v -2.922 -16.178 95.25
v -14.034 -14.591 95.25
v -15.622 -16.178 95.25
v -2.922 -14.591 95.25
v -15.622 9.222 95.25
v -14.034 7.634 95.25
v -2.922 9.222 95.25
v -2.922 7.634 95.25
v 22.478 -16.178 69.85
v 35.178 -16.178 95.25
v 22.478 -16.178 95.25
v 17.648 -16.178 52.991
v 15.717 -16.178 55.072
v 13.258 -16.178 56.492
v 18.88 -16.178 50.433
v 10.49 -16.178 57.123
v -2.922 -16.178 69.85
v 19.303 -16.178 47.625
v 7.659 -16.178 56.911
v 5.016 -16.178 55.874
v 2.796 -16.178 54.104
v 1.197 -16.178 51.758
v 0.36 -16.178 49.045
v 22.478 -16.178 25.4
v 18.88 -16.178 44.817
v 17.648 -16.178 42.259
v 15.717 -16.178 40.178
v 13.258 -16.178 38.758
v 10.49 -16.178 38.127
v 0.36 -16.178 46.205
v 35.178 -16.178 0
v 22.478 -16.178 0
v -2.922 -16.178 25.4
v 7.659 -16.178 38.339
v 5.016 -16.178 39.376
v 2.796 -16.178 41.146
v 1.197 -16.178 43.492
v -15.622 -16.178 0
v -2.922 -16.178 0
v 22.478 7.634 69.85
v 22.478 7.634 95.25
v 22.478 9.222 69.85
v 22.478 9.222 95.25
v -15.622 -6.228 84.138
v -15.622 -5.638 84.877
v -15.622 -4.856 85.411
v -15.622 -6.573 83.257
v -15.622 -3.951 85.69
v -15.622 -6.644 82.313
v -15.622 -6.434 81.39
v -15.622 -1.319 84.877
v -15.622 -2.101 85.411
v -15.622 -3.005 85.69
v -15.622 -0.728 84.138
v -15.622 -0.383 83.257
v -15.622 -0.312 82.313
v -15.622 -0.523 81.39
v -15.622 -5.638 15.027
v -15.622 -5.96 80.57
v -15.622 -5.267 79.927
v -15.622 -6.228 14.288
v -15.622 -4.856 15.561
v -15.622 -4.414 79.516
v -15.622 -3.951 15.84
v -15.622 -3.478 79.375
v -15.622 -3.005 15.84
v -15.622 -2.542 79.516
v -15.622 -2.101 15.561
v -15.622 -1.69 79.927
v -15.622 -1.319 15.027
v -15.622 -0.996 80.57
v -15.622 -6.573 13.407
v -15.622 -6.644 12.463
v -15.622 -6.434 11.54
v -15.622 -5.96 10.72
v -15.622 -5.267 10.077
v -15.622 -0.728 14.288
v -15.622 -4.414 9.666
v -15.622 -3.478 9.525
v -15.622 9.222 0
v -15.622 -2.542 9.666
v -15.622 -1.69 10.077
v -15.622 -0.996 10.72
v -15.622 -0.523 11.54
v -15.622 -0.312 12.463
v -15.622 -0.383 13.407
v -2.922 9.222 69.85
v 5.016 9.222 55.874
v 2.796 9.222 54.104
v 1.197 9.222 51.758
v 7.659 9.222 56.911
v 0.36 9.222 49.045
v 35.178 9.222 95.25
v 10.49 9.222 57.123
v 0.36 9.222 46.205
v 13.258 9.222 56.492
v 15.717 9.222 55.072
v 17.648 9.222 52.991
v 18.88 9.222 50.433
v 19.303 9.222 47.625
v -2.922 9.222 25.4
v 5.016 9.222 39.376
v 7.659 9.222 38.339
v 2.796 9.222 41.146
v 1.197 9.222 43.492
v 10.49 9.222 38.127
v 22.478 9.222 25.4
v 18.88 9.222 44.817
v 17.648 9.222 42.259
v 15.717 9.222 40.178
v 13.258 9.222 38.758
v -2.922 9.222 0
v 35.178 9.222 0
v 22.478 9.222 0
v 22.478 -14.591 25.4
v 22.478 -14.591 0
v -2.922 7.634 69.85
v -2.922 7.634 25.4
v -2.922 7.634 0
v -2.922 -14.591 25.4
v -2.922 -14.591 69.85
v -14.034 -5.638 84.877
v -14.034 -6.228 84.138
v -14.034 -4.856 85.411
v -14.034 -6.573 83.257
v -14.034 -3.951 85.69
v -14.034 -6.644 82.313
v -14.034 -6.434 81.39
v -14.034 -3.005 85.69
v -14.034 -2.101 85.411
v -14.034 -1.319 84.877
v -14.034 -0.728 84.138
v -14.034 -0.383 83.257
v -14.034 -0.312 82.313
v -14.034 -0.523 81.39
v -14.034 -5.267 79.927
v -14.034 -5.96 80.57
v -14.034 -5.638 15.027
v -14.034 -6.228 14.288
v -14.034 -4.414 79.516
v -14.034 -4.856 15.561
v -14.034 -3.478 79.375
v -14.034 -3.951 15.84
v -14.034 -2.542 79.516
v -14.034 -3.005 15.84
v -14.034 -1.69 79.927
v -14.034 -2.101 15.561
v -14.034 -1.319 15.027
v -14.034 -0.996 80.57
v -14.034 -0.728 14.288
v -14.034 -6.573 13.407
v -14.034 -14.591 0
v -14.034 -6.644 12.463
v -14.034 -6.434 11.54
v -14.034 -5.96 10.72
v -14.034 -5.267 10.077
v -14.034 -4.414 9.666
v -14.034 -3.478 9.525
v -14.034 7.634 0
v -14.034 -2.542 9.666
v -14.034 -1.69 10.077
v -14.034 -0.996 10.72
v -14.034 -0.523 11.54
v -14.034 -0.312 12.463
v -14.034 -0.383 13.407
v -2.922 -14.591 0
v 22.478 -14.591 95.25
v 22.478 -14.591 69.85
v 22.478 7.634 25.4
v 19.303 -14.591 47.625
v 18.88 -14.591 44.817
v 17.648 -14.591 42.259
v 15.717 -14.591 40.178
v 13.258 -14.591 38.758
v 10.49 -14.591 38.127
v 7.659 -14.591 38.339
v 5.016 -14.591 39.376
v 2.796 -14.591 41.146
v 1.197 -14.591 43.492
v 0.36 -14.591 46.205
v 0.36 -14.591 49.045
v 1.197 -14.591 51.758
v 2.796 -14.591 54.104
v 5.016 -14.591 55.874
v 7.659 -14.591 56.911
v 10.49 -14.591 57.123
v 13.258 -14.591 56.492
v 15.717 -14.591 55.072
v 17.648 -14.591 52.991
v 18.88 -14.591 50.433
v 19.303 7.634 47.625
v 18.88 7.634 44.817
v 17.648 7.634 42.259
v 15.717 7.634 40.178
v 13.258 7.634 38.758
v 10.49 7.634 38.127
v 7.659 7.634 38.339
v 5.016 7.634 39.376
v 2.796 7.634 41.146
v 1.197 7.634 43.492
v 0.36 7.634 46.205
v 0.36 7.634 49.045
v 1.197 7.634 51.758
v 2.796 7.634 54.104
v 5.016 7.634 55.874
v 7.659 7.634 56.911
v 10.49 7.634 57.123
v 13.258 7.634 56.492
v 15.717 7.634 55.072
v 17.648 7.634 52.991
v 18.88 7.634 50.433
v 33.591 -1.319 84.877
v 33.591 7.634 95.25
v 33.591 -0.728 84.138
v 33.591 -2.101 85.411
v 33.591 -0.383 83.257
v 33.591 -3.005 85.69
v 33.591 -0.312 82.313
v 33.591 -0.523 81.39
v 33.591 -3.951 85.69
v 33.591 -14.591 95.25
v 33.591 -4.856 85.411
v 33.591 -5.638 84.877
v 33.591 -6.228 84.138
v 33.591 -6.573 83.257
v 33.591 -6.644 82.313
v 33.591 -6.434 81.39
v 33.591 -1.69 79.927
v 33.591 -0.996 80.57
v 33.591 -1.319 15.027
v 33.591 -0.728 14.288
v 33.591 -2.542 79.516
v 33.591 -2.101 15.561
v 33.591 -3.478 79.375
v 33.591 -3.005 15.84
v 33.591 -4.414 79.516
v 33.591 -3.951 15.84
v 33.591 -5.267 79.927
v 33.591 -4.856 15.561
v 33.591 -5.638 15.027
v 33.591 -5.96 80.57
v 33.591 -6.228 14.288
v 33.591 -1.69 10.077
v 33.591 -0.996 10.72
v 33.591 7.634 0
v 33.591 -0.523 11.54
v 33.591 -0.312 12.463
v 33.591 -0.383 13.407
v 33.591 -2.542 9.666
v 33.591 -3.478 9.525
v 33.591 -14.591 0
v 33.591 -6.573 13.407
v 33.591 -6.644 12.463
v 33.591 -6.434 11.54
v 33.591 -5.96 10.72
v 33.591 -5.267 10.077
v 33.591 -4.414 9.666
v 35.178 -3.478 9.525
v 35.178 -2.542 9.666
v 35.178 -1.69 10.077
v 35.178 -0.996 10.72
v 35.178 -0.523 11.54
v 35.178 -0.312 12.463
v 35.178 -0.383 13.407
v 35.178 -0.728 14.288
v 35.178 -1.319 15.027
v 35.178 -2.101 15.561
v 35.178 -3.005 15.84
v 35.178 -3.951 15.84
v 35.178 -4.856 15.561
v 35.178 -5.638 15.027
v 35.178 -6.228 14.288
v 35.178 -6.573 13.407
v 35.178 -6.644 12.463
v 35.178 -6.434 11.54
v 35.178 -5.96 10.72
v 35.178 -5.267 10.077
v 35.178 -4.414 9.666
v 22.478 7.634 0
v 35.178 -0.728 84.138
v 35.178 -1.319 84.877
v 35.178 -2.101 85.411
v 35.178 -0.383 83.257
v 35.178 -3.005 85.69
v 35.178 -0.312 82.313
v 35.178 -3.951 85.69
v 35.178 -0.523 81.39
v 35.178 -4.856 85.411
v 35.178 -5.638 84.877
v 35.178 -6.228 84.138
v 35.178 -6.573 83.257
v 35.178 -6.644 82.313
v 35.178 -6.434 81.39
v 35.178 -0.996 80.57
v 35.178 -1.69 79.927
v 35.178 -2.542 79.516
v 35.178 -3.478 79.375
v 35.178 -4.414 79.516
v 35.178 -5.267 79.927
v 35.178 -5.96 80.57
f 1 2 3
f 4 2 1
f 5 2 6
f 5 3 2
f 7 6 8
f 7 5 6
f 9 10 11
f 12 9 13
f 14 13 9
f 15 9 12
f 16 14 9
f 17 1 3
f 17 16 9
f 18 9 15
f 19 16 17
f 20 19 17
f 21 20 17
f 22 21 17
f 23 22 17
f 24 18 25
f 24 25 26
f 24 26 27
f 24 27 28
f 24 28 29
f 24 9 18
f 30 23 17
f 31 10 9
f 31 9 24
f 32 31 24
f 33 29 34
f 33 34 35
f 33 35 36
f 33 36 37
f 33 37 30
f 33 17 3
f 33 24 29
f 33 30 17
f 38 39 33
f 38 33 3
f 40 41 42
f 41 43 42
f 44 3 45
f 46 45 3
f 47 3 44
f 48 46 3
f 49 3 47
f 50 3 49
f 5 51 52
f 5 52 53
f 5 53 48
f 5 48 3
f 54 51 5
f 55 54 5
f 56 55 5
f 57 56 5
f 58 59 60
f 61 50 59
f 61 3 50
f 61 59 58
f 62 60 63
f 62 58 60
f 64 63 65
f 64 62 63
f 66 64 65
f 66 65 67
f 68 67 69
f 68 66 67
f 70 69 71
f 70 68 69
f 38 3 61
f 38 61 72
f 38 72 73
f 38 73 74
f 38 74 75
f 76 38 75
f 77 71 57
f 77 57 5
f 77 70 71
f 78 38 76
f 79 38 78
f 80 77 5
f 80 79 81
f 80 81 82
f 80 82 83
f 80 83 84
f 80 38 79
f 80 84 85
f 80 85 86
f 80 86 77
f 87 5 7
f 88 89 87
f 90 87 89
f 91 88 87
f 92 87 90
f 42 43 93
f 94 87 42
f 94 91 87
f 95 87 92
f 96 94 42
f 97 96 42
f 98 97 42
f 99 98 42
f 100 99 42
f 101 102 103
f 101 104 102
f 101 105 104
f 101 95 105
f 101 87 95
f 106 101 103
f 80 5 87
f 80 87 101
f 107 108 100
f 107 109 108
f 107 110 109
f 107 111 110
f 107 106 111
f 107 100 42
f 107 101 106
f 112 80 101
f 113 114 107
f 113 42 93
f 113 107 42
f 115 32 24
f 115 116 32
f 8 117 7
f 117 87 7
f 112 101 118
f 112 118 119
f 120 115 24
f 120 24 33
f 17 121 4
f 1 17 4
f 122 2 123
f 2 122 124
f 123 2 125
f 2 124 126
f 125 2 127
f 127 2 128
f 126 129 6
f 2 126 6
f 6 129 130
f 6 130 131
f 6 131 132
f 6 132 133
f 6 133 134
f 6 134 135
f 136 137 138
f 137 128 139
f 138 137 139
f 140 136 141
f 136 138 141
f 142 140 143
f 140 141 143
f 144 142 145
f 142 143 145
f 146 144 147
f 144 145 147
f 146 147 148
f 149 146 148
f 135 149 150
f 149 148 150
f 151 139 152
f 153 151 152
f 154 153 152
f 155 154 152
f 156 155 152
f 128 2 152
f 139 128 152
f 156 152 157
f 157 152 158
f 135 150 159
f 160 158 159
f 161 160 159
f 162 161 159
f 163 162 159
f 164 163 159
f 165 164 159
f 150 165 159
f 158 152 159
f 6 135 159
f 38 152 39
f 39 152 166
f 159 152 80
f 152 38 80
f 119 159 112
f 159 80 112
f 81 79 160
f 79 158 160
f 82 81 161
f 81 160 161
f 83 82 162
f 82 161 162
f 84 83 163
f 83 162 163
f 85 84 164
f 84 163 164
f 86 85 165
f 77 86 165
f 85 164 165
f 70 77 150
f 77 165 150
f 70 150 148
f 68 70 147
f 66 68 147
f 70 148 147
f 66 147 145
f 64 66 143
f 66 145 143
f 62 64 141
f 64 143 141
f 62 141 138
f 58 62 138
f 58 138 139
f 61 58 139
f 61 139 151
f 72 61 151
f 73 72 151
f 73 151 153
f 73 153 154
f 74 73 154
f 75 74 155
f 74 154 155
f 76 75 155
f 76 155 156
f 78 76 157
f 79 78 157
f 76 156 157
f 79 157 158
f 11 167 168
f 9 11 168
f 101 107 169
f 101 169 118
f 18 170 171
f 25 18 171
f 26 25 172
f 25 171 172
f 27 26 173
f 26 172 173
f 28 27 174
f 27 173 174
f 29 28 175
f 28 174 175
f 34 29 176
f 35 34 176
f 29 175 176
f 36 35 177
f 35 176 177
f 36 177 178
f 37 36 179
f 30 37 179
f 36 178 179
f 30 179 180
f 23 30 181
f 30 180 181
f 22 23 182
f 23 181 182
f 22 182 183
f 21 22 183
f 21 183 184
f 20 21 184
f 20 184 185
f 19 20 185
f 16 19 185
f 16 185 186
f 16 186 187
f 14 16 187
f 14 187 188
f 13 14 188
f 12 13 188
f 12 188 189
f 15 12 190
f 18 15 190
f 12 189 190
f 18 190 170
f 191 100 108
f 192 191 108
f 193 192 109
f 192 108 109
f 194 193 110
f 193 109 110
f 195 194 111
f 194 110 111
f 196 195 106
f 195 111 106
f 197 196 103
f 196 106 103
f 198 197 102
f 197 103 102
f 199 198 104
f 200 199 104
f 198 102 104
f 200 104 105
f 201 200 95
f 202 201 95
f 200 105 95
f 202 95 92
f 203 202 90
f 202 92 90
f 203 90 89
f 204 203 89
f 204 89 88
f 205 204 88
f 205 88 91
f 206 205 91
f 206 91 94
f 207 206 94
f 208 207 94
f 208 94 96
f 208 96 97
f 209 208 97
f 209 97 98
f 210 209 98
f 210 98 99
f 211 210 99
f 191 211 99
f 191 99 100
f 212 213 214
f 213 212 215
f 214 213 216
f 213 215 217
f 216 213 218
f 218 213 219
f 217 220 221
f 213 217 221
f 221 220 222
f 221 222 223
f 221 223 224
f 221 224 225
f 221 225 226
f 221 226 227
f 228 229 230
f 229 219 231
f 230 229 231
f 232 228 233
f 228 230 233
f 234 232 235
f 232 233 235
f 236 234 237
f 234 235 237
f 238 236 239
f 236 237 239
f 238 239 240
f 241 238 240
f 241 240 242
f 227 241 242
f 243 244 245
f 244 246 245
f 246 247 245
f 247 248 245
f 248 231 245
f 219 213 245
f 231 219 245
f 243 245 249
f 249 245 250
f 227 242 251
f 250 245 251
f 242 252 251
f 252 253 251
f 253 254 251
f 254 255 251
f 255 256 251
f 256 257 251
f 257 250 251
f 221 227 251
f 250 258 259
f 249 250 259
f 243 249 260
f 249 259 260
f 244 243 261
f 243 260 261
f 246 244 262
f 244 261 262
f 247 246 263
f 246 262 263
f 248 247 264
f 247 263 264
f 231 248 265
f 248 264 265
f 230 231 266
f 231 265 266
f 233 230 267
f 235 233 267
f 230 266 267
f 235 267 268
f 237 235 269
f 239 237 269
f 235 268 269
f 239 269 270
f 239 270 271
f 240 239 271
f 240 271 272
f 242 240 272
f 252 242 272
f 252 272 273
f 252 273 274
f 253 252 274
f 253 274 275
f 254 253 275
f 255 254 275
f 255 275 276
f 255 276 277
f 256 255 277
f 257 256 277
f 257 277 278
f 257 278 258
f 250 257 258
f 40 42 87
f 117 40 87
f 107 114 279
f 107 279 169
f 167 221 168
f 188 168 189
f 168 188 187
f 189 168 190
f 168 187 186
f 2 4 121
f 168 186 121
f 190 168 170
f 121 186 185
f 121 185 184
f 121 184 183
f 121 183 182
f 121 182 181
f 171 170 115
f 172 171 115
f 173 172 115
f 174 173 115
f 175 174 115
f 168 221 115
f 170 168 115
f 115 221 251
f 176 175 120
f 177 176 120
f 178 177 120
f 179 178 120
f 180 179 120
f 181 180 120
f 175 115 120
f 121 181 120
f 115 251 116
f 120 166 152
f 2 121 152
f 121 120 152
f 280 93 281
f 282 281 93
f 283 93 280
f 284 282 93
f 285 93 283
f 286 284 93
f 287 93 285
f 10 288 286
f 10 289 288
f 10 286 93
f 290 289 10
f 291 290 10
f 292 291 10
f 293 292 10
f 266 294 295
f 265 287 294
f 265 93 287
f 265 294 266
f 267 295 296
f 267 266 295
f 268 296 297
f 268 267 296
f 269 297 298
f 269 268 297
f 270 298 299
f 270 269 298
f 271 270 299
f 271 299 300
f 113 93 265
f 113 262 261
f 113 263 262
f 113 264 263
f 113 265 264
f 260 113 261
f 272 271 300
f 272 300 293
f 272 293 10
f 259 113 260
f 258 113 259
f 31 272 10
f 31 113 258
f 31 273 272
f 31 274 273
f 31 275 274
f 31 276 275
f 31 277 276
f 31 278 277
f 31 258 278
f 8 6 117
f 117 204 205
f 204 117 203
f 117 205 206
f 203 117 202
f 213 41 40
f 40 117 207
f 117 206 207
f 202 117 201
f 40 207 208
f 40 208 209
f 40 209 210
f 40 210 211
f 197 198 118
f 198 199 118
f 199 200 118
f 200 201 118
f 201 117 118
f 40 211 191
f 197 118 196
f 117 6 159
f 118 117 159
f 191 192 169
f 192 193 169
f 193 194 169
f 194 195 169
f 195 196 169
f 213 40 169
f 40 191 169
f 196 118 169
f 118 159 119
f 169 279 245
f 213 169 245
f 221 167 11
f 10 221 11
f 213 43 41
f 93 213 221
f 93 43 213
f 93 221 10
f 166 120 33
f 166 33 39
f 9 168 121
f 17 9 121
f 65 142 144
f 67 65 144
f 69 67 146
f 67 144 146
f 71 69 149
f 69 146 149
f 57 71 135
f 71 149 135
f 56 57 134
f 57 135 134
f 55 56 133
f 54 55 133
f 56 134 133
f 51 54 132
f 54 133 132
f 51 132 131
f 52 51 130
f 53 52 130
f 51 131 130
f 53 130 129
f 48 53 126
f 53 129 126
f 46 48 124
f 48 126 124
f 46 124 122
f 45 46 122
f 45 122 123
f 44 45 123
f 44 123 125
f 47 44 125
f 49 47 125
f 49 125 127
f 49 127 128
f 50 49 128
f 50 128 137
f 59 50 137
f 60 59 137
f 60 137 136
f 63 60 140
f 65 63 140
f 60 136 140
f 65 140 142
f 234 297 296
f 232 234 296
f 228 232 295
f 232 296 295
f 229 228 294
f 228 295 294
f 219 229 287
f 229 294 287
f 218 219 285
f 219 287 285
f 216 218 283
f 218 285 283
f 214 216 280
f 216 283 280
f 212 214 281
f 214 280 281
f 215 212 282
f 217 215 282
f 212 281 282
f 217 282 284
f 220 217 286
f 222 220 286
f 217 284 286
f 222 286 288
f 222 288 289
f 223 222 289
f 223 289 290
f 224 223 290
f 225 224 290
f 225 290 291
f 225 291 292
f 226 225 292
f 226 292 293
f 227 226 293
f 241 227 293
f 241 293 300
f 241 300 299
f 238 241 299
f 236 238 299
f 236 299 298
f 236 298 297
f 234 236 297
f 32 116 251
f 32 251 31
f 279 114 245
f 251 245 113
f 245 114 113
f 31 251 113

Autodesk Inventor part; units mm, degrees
ref_plane "YZ Plane" through (0, 0, 0) normal (1, 0, 0) x (0, 1, 0)
ref_plane "XZ Plane" through (0, 0, 0) normal (0, 1, 0) x (-1, 0, 0)
ref_plane "XY Plane" through (0, 0, 0) normal (0, 0, 1) x (1, 0, 0)
sketch "Sketch1" plane through (0, 0, 0) normal (0, 0, 1) x (1, 0, 0)
  line L0 (-15.6216, 9.2219) -> (35.1784, 9.2219)
  line L1 (35.1784, 9.2219) -> (35.1784, -16.1781)
  line L2 (35.1784, -16.1781) -> (-15.6216, -16.1781)
  line L3 (-15.6216, -16.1781) -> (-15.6216, 9.2219)
  line L4 (-14.0341, 7.6344) -> (33.5909, 7.6344)
  line L5 (33.5909, 7.6344) -> (33.5909, -14.5906)
  line L6 (33.5909, -14.5906) -> (-14.0341, -14.5906)
  line L7 (-14.0341, -14.5906) -> (-14.0341, 7.6344)
  point P0 (0, 0)
  dimension "d0" = 50.8
  dimension "d1" = 25.4
  dimension "d2" = 1.5875
  dimension "d3" = 1.5875
  dimension "d4" = 1.5875
  dimension "d5" = 1.5875
extrude "Extrusion1" add sketch "Sketch1" along normal blind 95.25
sketch "Sketch2" plane through (-15.6216, 9.2219, 0) normal (0, 1, 0) x (1, 0, 0)
  circle A0 centre (25.4, -47.625) radius 9.525
  line L0 (0, 0) -> (0, -95.25) projected
  line L1 (50.8, 0) -> (0, 0) projected
  line L2 (12.7, 0) -> (38.1, 0)
  line L3 (38.1, 0) -> (38.1, -25.4)
  line L4 (38.1, -25.4) -> (12.7, -25.4)
  line L5 (12.7, -25.4) -> (12.7, 0)
  line L6 (1.5875, -95.25) -> (49.2125, -95.25) projected
  line L7 (12.7, -95.25) -> (38.1, -95.25)
  line L8 (38.1, -95.25) -> (38.1, -69.85)
  line L9 (38.1, -69.85) -> (12.7, -69.85)
  line L10 (12.7, -69.85) -> (12.7, -95.25)
  point P0 (15.6216, 0)
  point P1 (25.4, -25.4)
  dimension "d8" = 19.05
  dimension "d9" = 25.4
  dimension "d10" = 47.625
  dimension "d13" = 25.4
  dimension "d14" = 25.4
  dimension "d15" = 25.4
  dimension "d16" = 25.4
  dimension "d25" = 95.25
extrude "Extrusion2" cut sketch "Sketch2" against normal blind 116.84
sketch "Sketch3" plane through (35.1784, -16.1781, 0) normal (1, 0, 0) x (0, 0, -1)
  circle A0 centre (-12.7, 12.7) radius 3.175
  line L0 (0, 25.4) -> (-95.25, 25.4) projected
  circle A1 centre (-82.55, 12.7) radius 3.175
  line L1 (-95.25, 0) -> (-95.25, 25.4) projected
  point P0 (0, 16.1781)
  dimension "d17" = 6.35
  dimension "d18" = 12.7
  dimension "d19" = 12.7
  dimension "d20" = 6.35
  dimension "d21" = 12.7
  dimension "d22" = 12.7
extrude "Extrusion3" cut sketch "Sketch3" against normal through all
equation "\"d3\" = d2"
equation "\"d4\" = d2"
equation "\"d5\" = d2"
equation "\"d10\" = 0.5 * d25"
properties part number "Diff Top Bar"
